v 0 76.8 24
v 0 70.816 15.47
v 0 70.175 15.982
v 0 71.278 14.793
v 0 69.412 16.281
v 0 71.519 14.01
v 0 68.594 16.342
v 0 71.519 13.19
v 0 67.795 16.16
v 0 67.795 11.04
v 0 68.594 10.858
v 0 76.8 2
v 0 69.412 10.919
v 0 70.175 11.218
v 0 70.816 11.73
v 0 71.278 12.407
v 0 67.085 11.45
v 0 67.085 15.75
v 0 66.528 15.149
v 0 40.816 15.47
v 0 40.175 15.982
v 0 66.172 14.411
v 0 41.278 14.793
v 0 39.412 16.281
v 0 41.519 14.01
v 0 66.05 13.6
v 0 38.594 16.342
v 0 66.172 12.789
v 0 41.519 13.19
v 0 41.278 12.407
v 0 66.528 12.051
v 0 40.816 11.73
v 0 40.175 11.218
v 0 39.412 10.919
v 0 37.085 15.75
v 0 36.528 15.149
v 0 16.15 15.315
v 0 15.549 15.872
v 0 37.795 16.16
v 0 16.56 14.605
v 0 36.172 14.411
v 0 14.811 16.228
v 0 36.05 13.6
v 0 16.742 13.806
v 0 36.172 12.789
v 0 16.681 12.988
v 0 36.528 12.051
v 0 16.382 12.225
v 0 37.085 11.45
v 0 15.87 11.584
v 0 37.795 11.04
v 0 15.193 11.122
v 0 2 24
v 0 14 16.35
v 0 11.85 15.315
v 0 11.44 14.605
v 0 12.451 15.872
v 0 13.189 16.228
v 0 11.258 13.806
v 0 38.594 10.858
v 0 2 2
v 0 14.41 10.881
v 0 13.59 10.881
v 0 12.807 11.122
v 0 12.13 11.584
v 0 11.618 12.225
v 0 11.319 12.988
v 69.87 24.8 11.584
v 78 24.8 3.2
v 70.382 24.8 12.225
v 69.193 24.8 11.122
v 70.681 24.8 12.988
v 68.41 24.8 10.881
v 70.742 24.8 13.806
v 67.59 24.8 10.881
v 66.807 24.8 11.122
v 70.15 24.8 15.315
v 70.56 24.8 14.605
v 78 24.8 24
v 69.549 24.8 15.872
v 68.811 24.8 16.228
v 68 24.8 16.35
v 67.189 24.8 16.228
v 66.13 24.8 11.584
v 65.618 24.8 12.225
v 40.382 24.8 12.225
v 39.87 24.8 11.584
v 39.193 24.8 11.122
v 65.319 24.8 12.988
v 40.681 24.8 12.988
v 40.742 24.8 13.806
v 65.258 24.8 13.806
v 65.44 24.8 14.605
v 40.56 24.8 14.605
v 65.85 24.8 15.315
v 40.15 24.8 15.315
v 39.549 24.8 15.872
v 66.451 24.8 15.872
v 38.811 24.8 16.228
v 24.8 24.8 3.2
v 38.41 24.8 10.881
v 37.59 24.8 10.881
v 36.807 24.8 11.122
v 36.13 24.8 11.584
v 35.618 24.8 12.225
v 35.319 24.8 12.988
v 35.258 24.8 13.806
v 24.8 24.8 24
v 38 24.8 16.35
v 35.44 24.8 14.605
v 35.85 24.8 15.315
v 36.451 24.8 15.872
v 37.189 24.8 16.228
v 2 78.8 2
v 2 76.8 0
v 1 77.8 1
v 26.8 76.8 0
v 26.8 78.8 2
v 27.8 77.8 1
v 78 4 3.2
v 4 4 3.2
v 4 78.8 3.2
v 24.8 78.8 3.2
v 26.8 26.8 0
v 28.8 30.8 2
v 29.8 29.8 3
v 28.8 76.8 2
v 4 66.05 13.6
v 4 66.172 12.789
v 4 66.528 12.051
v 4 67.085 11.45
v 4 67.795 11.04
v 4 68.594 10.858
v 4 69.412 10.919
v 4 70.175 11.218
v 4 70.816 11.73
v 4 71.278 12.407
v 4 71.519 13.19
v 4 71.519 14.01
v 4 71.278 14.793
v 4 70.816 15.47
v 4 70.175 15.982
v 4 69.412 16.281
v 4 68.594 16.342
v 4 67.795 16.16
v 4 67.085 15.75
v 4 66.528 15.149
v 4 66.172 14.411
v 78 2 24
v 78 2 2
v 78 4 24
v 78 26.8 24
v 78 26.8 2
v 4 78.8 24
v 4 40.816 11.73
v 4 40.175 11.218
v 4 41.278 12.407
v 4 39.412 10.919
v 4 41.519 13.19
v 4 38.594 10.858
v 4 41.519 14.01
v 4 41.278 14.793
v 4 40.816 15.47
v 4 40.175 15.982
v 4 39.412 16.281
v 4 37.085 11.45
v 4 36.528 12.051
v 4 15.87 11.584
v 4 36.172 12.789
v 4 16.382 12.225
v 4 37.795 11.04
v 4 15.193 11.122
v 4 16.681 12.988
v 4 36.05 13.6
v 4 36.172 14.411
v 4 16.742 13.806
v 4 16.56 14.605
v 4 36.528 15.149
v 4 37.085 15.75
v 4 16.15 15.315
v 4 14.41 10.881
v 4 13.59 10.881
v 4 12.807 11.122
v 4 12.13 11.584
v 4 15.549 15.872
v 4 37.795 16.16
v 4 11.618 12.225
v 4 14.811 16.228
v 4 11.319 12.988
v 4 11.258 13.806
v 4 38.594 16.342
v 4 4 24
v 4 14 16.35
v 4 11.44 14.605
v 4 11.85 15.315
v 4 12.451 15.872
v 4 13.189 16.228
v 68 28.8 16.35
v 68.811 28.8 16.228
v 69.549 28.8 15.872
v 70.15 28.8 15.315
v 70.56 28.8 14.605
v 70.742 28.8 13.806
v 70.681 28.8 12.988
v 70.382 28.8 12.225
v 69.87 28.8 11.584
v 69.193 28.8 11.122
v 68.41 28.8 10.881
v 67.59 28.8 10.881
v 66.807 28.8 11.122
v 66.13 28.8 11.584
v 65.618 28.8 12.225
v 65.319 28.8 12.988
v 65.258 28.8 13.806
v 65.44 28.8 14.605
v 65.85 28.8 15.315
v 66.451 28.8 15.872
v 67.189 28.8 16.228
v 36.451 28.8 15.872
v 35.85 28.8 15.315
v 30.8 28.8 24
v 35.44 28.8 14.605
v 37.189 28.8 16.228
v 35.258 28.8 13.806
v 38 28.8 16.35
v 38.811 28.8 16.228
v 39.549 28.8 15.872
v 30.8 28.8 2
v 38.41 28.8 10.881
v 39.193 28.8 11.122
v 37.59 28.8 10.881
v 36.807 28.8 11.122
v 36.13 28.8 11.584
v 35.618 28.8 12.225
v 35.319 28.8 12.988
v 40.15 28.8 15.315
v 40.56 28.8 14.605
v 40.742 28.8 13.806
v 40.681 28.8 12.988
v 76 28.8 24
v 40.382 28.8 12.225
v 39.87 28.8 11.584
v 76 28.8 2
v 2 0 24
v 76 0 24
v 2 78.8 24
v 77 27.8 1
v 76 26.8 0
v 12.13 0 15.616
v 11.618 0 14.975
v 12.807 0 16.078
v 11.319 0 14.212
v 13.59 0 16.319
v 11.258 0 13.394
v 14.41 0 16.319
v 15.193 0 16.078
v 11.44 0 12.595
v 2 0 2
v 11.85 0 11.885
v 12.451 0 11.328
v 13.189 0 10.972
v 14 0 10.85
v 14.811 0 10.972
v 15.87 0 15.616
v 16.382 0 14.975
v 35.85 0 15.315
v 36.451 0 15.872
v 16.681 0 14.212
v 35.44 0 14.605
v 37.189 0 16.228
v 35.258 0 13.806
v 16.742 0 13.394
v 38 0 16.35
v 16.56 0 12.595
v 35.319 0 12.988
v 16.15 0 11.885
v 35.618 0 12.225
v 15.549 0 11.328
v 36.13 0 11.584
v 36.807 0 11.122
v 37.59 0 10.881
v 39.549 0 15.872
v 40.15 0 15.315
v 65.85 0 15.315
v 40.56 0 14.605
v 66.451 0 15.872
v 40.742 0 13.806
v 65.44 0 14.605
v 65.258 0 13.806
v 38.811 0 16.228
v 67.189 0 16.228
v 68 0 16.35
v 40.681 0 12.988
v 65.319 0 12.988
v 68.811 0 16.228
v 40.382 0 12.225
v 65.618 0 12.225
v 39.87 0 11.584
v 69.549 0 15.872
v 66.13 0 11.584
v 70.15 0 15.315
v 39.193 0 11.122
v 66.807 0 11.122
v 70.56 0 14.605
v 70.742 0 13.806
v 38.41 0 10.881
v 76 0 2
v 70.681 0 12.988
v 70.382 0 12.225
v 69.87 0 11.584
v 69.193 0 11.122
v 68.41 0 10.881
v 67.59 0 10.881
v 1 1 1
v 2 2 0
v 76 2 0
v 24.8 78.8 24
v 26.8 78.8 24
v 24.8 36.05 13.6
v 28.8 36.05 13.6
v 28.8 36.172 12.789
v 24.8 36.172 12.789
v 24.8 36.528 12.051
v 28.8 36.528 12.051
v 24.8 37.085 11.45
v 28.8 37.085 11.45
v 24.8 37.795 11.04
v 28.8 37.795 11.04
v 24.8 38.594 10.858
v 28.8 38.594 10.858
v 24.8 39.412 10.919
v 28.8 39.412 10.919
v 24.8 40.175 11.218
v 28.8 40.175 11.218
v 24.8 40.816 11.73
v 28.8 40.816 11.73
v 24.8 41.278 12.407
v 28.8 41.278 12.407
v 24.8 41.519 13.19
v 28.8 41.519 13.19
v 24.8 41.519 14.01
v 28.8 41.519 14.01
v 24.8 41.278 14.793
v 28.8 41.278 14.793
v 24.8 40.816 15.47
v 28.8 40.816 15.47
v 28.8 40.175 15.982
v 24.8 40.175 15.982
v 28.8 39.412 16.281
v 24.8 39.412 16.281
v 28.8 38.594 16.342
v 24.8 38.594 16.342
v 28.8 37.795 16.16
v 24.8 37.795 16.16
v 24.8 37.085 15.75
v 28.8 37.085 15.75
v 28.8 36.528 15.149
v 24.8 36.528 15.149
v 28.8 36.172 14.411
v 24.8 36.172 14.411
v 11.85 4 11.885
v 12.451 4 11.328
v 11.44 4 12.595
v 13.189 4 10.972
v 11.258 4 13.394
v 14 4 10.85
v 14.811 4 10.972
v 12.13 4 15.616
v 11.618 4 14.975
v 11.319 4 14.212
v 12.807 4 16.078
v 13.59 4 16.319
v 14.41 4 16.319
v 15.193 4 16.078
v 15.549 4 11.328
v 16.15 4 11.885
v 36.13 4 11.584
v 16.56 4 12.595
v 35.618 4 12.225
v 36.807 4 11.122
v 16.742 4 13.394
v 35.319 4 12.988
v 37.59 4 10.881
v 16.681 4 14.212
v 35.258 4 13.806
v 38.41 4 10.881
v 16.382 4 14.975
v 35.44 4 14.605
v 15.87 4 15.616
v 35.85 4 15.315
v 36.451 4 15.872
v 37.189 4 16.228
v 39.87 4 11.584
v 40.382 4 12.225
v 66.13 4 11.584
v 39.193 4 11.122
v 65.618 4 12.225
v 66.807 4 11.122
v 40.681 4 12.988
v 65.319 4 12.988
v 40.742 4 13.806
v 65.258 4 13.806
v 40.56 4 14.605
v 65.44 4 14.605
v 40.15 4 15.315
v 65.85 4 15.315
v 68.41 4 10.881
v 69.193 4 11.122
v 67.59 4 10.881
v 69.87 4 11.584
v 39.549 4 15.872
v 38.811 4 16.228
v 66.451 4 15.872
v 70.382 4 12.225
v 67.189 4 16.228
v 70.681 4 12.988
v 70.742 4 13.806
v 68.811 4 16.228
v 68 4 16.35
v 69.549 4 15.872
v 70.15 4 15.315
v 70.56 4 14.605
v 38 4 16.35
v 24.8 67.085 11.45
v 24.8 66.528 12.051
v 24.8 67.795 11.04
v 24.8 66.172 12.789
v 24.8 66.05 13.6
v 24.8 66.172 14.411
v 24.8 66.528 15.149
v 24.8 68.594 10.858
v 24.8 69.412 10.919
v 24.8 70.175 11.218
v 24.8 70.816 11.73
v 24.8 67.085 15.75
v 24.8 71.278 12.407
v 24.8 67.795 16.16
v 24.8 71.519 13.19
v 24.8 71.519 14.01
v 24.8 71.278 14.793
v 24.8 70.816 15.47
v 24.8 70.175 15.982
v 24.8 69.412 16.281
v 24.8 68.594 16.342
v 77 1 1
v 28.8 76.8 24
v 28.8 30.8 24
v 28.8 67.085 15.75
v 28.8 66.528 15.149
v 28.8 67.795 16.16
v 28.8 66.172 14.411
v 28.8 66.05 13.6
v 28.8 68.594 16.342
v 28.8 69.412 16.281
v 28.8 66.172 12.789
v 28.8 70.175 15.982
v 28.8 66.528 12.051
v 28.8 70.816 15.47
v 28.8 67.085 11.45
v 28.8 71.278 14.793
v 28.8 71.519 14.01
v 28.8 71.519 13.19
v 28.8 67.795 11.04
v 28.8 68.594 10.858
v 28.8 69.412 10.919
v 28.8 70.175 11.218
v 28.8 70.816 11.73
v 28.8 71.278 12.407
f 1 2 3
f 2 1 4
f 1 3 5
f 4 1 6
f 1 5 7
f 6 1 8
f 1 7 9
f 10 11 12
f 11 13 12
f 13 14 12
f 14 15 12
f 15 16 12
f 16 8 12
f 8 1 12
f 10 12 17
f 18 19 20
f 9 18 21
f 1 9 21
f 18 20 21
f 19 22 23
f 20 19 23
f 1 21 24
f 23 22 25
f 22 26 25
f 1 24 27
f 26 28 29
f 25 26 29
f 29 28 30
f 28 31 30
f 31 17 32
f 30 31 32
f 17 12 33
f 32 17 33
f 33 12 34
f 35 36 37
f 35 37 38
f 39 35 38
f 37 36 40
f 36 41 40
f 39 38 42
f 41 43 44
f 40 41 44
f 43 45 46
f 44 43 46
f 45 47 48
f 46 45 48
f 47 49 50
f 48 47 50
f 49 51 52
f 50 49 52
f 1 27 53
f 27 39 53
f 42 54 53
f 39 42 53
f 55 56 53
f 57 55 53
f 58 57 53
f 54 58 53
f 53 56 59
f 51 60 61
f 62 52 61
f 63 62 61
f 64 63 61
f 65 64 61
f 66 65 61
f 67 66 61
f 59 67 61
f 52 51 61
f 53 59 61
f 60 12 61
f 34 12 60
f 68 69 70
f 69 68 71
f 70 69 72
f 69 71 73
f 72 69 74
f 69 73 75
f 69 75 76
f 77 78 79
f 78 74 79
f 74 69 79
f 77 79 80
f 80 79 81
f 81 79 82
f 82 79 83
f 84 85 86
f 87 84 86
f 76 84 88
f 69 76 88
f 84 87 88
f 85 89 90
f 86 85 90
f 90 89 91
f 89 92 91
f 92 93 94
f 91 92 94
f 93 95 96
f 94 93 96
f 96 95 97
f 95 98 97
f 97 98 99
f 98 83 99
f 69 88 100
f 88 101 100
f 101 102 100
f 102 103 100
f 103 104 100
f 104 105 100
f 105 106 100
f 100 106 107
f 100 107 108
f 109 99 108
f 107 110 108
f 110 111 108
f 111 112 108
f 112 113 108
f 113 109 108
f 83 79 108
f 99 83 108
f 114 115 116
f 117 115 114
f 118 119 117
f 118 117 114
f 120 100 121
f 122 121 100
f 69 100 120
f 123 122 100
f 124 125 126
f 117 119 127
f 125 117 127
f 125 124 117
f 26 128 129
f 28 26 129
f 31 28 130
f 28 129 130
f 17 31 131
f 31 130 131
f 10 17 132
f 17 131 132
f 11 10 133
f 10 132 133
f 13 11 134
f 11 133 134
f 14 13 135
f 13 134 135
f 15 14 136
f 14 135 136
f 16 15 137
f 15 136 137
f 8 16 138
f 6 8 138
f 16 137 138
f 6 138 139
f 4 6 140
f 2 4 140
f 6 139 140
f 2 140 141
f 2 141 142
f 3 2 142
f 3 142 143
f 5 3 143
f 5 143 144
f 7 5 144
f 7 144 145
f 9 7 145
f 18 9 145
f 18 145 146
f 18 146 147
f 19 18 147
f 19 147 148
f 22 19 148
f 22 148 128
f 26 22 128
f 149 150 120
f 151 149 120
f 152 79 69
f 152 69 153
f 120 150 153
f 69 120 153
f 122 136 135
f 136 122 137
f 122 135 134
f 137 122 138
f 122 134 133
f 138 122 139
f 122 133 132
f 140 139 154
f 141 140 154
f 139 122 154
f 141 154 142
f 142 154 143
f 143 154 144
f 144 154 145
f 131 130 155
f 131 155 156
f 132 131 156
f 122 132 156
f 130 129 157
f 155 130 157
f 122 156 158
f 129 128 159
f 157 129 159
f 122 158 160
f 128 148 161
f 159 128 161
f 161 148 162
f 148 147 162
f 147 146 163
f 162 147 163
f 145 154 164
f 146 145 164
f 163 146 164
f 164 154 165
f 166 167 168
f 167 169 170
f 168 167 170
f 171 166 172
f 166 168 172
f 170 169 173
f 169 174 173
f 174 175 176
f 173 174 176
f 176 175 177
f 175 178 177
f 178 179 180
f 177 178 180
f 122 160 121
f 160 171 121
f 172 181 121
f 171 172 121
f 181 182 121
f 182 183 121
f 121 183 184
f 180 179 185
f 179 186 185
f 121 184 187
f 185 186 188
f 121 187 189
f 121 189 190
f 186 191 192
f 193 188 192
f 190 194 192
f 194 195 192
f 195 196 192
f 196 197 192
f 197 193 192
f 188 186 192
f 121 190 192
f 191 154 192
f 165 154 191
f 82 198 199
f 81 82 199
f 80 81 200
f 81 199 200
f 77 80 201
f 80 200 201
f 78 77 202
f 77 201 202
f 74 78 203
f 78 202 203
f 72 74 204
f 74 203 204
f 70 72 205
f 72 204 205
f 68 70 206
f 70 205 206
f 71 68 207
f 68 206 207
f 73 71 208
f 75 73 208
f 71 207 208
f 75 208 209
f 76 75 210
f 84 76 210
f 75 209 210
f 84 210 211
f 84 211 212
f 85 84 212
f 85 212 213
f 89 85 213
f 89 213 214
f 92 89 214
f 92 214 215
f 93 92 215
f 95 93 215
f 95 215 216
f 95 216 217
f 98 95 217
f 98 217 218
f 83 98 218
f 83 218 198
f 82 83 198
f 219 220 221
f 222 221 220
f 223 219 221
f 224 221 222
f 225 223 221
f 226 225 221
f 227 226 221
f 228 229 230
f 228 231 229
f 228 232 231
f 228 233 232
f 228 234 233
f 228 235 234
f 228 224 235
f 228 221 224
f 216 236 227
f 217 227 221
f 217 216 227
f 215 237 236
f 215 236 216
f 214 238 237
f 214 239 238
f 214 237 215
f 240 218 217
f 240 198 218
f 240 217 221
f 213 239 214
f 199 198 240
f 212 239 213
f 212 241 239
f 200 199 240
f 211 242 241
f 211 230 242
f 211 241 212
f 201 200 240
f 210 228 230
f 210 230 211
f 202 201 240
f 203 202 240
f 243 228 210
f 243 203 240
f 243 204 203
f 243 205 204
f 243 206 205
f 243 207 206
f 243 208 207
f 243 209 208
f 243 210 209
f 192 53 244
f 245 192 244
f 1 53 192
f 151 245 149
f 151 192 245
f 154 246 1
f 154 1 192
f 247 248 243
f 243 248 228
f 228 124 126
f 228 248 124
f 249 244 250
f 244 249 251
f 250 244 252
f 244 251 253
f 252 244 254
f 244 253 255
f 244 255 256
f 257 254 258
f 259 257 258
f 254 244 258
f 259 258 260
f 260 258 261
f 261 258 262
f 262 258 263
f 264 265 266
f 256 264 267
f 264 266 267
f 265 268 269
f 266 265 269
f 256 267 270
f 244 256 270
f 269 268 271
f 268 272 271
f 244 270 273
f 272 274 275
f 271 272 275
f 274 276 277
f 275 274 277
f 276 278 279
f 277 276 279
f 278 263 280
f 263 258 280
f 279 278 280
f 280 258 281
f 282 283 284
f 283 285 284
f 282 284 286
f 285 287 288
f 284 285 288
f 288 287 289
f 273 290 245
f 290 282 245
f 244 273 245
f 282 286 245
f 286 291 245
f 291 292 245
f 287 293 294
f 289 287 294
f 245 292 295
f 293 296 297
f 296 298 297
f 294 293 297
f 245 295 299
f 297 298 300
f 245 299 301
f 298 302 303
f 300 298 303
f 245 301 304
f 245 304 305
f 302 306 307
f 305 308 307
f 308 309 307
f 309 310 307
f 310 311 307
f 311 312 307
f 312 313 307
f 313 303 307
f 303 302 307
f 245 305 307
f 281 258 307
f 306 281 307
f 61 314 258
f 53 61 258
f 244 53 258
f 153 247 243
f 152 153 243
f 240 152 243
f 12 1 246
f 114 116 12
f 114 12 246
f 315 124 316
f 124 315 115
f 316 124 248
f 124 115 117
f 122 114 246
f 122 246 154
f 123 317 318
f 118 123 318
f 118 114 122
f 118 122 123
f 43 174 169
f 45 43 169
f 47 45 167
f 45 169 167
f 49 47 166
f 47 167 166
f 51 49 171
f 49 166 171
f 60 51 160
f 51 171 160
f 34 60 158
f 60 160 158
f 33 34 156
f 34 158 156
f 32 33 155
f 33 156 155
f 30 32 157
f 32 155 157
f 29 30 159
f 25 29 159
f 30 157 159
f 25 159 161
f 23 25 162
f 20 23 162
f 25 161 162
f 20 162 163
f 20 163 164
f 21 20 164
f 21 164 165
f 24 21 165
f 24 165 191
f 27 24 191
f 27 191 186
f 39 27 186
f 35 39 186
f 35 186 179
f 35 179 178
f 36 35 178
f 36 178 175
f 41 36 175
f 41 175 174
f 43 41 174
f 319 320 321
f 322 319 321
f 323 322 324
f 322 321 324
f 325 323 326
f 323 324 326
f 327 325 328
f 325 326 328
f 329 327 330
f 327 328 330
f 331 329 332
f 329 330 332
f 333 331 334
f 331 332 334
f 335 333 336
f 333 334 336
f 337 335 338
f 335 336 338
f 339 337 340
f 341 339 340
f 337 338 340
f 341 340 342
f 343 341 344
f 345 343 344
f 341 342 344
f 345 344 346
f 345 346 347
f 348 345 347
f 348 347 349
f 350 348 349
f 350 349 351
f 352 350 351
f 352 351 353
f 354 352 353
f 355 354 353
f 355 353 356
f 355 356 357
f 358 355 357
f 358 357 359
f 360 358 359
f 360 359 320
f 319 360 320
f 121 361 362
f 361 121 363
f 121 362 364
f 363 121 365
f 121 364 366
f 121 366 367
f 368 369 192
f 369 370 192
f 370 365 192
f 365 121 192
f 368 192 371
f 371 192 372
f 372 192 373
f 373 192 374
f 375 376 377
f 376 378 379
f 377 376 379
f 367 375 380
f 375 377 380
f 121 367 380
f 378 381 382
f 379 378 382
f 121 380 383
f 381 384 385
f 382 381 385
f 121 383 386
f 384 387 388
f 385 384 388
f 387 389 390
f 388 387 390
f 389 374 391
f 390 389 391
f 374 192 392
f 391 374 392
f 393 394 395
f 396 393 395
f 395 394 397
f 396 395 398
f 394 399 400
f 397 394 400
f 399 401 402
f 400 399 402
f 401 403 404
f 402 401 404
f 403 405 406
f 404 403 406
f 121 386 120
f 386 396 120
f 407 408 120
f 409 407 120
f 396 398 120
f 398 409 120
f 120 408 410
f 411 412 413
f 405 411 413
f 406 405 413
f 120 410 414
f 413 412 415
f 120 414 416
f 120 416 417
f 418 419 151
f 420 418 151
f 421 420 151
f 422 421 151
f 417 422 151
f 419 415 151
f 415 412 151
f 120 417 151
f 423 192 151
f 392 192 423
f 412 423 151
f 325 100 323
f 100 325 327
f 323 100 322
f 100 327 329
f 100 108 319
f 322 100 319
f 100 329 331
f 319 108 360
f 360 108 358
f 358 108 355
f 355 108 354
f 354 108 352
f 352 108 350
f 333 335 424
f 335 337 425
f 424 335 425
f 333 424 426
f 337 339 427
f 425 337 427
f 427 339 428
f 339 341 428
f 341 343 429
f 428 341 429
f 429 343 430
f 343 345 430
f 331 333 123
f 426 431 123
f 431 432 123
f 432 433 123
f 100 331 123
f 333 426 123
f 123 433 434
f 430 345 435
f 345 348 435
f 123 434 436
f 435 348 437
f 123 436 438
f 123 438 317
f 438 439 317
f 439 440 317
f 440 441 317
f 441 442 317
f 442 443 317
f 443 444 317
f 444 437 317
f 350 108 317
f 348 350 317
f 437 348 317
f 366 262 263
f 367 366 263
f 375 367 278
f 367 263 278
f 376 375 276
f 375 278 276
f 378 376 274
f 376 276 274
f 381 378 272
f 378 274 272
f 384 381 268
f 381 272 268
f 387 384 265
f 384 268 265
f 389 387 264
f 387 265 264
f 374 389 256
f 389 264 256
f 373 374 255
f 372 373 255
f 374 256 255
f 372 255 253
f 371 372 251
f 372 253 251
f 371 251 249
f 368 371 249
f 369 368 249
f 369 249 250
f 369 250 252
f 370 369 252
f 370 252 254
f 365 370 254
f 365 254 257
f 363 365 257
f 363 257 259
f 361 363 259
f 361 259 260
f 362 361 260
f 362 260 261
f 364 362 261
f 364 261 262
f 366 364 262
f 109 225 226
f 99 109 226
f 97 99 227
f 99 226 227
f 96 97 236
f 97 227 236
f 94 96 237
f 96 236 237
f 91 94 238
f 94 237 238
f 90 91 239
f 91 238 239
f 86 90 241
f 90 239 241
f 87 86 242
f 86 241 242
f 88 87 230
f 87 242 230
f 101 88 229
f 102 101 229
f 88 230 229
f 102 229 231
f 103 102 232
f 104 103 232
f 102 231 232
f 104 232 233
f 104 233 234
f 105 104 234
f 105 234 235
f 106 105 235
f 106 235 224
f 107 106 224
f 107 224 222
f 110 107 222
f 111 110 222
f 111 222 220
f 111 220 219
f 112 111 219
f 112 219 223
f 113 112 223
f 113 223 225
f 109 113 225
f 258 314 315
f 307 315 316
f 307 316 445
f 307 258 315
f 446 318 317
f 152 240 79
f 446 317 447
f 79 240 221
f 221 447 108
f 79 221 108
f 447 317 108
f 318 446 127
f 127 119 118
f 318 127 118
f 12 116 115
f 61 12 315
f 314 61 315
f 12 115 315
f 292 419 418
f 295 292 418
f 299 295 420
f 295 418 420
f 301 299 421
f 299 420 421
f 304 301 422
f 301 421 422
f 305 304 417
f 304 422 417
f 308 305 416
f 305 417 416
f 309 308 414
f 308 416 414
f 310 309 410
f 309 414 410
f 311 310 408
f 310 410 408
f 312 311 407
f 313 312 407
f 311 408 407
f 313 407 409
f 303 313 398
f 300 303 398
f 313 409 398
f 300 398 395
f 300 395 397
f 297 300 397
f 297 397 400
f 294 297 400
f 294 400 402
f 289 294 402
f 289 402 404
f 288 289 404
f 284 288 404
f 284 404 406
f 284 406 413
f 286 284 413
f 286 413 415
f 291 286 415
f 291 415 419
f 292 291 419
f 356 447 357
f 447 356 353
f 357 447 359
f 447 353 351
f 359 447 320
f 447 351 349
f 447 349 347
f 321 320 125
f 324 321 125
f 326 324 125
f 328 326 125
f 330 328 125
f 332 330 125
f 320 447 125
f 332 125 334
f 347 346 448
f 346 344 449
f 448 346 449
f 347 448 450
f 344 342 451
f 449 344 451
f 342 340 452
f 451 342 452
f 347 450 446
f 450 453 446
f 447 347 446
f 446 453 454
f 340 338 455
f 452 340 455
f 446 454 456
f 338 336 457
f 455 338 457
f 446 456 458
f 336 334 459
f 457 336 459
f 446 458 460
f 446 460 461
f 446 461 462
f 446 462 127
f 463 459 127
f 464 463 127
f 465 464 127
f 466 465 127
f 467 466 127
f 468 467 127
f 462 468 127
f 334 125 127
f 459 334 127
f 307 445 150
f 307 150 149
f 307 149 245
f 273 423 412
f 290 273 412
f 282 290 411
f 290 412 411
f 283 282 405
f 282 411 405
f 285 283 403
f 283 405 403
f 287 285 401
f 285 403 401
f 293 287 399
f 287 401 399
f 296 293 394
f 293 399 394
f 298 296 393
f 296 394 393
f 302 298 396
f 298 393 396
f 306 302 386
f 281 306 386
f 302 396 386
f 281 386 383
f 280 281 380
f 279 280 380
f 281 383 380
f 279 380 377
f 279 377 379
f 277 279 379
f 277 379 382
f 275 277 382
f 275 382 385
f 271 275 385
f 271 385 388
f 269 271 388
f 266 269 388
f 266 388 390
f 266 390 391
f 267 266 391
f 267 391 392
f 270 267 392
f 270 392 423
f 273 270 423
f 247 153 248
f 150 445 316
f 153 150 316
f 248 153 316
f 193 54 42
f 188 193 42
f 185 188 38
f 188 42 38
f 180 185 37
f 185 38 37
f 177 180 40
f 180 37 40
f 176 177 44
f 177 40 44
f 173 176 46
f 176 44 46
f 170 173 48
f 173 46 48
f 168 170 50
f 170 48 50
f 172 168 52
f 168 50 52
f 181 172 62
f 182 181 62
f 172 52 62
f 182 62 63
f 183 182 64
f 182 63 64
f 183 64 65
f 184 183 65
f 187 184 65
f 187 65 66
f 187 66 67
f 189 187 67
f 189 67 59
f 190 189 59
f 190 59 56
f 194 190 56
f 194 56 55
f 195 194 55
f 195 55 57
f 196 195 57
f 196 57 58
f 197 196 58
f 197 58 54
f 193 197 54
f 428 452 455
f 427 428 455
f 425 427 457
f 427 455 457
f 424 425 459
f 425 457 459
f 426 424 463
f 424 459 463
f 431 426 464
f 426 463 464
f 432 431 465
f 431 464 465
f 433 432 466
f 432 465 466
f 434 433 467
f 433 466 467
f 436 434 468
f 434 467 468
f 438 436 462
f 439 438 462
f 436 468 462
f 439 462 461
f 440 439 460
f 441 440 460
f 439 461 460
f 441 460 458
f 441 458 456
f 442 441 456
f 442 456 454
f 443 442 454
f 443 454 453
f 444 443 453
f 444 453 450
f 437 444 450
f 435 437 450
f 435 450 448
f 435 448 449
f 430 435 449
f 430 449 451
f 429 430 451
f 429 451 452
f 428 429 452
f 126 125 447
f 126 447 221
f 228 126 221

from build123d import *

# Parameters (mm, degrees)
ESQUISSE2_W             = 28.8
ESQUISSE2_H             = 50
ESQUISSE2_W_2           = 78
ESQUISSE2_H_2           = 28.8
BOSS_EXTRU_2_DEPTH      = 24
ENL_V_MAT_EXTRU_1_DEPTH = 20.8
ESQUISSE4_R             = 2.75
ENL_V_MAT_EXTRU_2_DEPTH = 31.389271111
ESQUISSE5_R             = 2.75
ENL_V_MAT_EXTRU_3_DEPTH = 31.389271111
ESQUISSE6_R             = 2.75
ENL_V_MAT_EXTRU_4_DEPTH = 31.389271111
ESQUISSE7_R             = 2.75
ENL_V_MAT_EXTRU_5_DEPTH = 31.389271111
CHANFREIN1_SIZE         = 2
CHANFREIN2_SIZE         = 2


with BuildPart() as part:
    # Esquisse2 → Boss.-Extru.2 (new body)
    with BuildSketch(Plane.XY):
        with Locations((14.4, 53.8)):
            Rectangle(ESQUISSE2_W, ESQUISSE2_H)
        with Locations((39, 14.4)):
            Rectangle(ESQUISSE2_W_2, ESQUISSE2_H_2)
    extrude(amount=BOSS_EXTRU_2_DEPTH)

    # Esquisse3 → Enlèv. mat.-Extru.1 (cut)
    with BuildSketch(Plane.XY.offset(24)):
        Polygon((4, 78.8), (4, 4), (78, 4), (78, 24.8), (24.8, 24.8), (24.8, 78.8), align=None)
    extrude(amount=-ENL_V_MAT_EXTRU_1_DEPTH, mode=Mode.SUBTRACT)

    # Esquisse4 → Enlèv. mat.-Extru.2 (cut)
    with BuildSketch(Plane(origin=(0, 28.8, 0), x_dir=(1, 0, 0), z_dir=(0, 1, 0))):
        with Locations(Location((68, -13.6, 0), (0, 0, 270))):
            Circle(ESQUISSE4_R)
        with Locations(Location((38, -13.6, 0), (0, 0, 270))):
            Circle(ESQUISSE4_R)
    extrude(amount=-ENL_V_MAT_EXTRU_2_DEPTH, mode=Mode.SUBTRACT)

    # Esquisse5 → Enlèv. mat.-Extru.3 (cut)
    with BuildSketch(Plane(origin=(28.8, 0, 0), x_dir=(0, 0, -1), z_dir=(1, 0, 0))):
        with Locations(Location((-13.6, 38.8, 0), (0, 0, 270))):
            Circle(ESQUISSE5_R)
        with Locations(Location((-13.6, 68.8, 0), (0, 0, 270))):
            Circle(ESQUISSE5_R)
    extrude(amount=-ENL_V_MAT_EXTRU_3_DEPTH, mode=Mode.SUBTRACT)

    # Esquisse6 → Enlèv. mat.-Extru.4 (cut)
    with BuildSketch(Plane.ZY):
        with Locations((13.6, 14)):
            Circle(ESQUISSE6_R)
    extrude(amount=-ENL_V_MAT_EXTRU_4_DEPTH, mode=Mode.SUBTRACT)

    # Esquisse7 → Enlèv. mat.-Extru.5 (cut)
    with BuildSketch(Plane.XZ):
        with Locations(Location((14, 13.6, 0), (0, 0, 270))):
            Circle(ESQUISSE7_R)
    extrude(amount=-ENL_V_MAT_EXTRU_5_DEPTH, mode=Mode.SUBTRACT)

    # Chanfrein1
    chanfrein1_edges = [part.edges().sort_by_distance(p)[0] for p in [
        (28.8, 53.8, 0),
        (53.4, 28.8, 0),
        (39, 0, 0),
        (0, 39.4, 0),
    ]]
    chamfer(chanfrein1_edges, length=CHANFREIN1_SIZE)

    # Chanfrein2
    # the kernel refuses this chamfer: 2 mm, written as the material it adds along each edge
    with BuildSketch(Plane(origin=(28.8, 28.8, -3.143365976), x_dir=(-0.027495876610585647, 0.9996219169112968, 0), z_dir=(0, 0, 1))) as chanfrein2_piece_1_section:
        Polygon((CHANFREIN2_SIZE * 0.999621916911, -CHANFREIN2_SIZE * 0.0274958766106), (-CHANFREIN2_SIZE * 0.0274958766106, -CHANFREIN2_SIZE * 0.999621916911), (0, 0), align=None)
    chanfrein2_piece_1 = extrude(amount=27.143365976, mode=Mode.PRIVATE)
    chanfrein2_piece_1 = split(chanfrein2_piece_1, bisect_by=Plane(origin=(29.819330427, 29.005558504, 3.019330427), z_dir=(0.7071067811865476, 0, -0.7071067811865476)), keep=Keep.TOP, mode=Mode.PRIVATE)
    chanfrein2_piece_1 = split(chanfrein2_piece_1, bisect_by=Plane(origin=(30.090587735, 29.276815812, 2.476815812), z_dir=(0, -0.7071067811865476, 0.7071067811865476)), keep=Keep.TOP, mode=Mode.PRIVATE)
    add(chanfrein2_piece_1)
    with BuildSketch(Plane(origin=(28.8, 28.8, -3.143365976), x_dir=(-0.027495876610585647, 0.9996219169112968, 0), z_dir=(0, 0, 1))) as chanfrein2_piece_2_section:
        Polygon((CHANFREIN2_SIZE * 0.999621916911, -CHANFREIN2_SIZE * 0.0274958766106), (-CHANFREIN2_SIZE * 0.0274958766106, -CHANFREIN2_SIZE * 0.999621916911), (0, 0), align=None)
    chanfrein2_piece_2 = extrude(amount=27.143365976, mode=Mode.PRIVATE)
    chanfrein2_piece_2 = split(chanfrein2_piece_2, bisect_by=Plane(origin=(29.276815812, 30.090587735, 2.476815812), z_dir=(-0.7071067811865476, 0, 0.7071067811865476)), keep=Keep.TOP, mode=Mode.PRIVATE)
    chanfrein2_piece_2 = split(chanfrein2_piece_2, bisect_by=Plane(origin=(29.005558504, 29.819330427, 3.019330427), z_dir=(0, 0.7071067811865476, -0.7071067811865476)), keep=Keep.TOP, mode=Mode.PRIVATE)
    add(chanfrein2_piece_2)
    with BuildSketch(Plane(origin=(28.8, 28.8, -3.143365976), x_dir=(-0.027495876610585647, 0.9996219169112968, 0), z_dir=(0, 0, 1))) as chanfrein2_piece_3_section:
        Polygon((CHANFREIN2_SIZE * 0.999621916911, -CHANFREIN2_SIZE * 0.0274958766106), (-CHANFREIN2_SIZE * 0.0274958766106, -CHANFREIN2_SIZE * 0.999621916911), (0, 0), align=None)
    chanfrein2_piece_3 = extrude(amount=27.143365976, mode=Mode.PRIVATE)
    chanfrein2_piece_3 = split(chanfrein2_piece_3, bisect_by=Plane(origin=(34.880092378, 29.455254944, 8.080092378), z_dir=(-0.7071067811865476, 0, 0.7071067811865476)), keep=Keep.TOP, mode=Mode.PRIVATE)
    chanfrein2_piece_3 = split(chanfrein2_piece_3, bisect_by=Plane(origin=(29.455254944, 34.880092378, 8.080092378), z_dir=(0, -0.7071067811865476, 0.7071067811865476)), keep=Keep.TOP, mode=Mode.PRIVATE)
    add(chanfrein2_piece_3)
    # the kernel refuses this chamfer: 2 mm, written as the material it takes off along each edge
    with BuildSketch(Plane(origin=(0, 0, -3.143365976), x_dir=(-0.027495876610586372, 0.9996219169112968, 0), z_dir=(0, 0, 1)), Plane(origin=(28.8, 78.8, -3.143365976), x_dir=(0.02749587661058555, -0.9996219169112968, 0), z_dir=(0, 0, 1)), Plane(origin=(78, 28.8, -3.143365976), x_dir=(0.0274958766105891, -0.9996219169112968, 0), z_dir=(0, 0, 1))) as chanfrein2_2_piece_1:
        Polygon((CHANFREIN2_SIZE * 0.999621916911, -CHANFREIN2_SIZE * 0.0274958766106), (-CHANFREIN2_SIZE * 0.0274958766106, -CHANFREIN2_SIZE * 0.999621916911), (0, 0), align=None)
    extrude(amount=32.286731952, mode=Mode.SUBTRACT)
    with BuildSketch(Plane(origin=(0, 78.8, -3.143365976), x_dir=(-0.027495876610586292, -0.9996219169112968, 0), z_dir=(0, 0, 1)), Plane(origin=(78, 0, -3.143365976), x_dir=(0.02749587661058908, 0.9996219169112968, 0), z_dir=(0, 0, 1))) as chanfrein2_2_piece_2:
        Polygon((CHANFREIN2_SIZE * 0.999621916911, CHANFREIN2_SIZE * 0.0274958766106), (-CHANFREIN2_SIZE * 0.0274958766106, CHANFREIN2_SIZE * 0.999621916911), (0, 0), align=None)
    extrude(amount=32.286731952, mode=Mode.SUBTRACT)
    with BuildSketch(Plane(origin=(31.943365976, 78.8, 0), x_dir=(0, -0.9996219169112968, -0.027495876610586292), z_dir=(-1, 0, 0))) as chanfrein2_2_piece_3:
        Polygon((CHANFREIN2_SIZE * 0.999621916911, CHANFREIN2_SIZE * 0.0274958766106), (-CHANFREIN2_SIZE * 0.0274958766106, CHANFREIN2_SIZE * 0.999621916911), (0, 0), align=None)
    extrude(amount=35.086731952, mode=Mode.SUBTRACT)
    with BuildSketch(Plane(origin=(78, -3.143365976, 0), x_dir=(0.02749587661058908, 0, 0.9996219169112968), z_dir=(0, 1, 0))) as chanfrein2_2_piece_4:
        Polygon((CHANFREIN2_SIZE * 0.999621916911, -CHANFREIN2_SIZE * 0.0274958766106), (-CHANFREIN2_SIZE * 0.0274958766106, -CHANFREIN2_SIZE * 0.999621916911), (0, 0), align=None)
    extrude(amount=35.086731952, mode=Mode.SUBTRACT)


solid = part.part
